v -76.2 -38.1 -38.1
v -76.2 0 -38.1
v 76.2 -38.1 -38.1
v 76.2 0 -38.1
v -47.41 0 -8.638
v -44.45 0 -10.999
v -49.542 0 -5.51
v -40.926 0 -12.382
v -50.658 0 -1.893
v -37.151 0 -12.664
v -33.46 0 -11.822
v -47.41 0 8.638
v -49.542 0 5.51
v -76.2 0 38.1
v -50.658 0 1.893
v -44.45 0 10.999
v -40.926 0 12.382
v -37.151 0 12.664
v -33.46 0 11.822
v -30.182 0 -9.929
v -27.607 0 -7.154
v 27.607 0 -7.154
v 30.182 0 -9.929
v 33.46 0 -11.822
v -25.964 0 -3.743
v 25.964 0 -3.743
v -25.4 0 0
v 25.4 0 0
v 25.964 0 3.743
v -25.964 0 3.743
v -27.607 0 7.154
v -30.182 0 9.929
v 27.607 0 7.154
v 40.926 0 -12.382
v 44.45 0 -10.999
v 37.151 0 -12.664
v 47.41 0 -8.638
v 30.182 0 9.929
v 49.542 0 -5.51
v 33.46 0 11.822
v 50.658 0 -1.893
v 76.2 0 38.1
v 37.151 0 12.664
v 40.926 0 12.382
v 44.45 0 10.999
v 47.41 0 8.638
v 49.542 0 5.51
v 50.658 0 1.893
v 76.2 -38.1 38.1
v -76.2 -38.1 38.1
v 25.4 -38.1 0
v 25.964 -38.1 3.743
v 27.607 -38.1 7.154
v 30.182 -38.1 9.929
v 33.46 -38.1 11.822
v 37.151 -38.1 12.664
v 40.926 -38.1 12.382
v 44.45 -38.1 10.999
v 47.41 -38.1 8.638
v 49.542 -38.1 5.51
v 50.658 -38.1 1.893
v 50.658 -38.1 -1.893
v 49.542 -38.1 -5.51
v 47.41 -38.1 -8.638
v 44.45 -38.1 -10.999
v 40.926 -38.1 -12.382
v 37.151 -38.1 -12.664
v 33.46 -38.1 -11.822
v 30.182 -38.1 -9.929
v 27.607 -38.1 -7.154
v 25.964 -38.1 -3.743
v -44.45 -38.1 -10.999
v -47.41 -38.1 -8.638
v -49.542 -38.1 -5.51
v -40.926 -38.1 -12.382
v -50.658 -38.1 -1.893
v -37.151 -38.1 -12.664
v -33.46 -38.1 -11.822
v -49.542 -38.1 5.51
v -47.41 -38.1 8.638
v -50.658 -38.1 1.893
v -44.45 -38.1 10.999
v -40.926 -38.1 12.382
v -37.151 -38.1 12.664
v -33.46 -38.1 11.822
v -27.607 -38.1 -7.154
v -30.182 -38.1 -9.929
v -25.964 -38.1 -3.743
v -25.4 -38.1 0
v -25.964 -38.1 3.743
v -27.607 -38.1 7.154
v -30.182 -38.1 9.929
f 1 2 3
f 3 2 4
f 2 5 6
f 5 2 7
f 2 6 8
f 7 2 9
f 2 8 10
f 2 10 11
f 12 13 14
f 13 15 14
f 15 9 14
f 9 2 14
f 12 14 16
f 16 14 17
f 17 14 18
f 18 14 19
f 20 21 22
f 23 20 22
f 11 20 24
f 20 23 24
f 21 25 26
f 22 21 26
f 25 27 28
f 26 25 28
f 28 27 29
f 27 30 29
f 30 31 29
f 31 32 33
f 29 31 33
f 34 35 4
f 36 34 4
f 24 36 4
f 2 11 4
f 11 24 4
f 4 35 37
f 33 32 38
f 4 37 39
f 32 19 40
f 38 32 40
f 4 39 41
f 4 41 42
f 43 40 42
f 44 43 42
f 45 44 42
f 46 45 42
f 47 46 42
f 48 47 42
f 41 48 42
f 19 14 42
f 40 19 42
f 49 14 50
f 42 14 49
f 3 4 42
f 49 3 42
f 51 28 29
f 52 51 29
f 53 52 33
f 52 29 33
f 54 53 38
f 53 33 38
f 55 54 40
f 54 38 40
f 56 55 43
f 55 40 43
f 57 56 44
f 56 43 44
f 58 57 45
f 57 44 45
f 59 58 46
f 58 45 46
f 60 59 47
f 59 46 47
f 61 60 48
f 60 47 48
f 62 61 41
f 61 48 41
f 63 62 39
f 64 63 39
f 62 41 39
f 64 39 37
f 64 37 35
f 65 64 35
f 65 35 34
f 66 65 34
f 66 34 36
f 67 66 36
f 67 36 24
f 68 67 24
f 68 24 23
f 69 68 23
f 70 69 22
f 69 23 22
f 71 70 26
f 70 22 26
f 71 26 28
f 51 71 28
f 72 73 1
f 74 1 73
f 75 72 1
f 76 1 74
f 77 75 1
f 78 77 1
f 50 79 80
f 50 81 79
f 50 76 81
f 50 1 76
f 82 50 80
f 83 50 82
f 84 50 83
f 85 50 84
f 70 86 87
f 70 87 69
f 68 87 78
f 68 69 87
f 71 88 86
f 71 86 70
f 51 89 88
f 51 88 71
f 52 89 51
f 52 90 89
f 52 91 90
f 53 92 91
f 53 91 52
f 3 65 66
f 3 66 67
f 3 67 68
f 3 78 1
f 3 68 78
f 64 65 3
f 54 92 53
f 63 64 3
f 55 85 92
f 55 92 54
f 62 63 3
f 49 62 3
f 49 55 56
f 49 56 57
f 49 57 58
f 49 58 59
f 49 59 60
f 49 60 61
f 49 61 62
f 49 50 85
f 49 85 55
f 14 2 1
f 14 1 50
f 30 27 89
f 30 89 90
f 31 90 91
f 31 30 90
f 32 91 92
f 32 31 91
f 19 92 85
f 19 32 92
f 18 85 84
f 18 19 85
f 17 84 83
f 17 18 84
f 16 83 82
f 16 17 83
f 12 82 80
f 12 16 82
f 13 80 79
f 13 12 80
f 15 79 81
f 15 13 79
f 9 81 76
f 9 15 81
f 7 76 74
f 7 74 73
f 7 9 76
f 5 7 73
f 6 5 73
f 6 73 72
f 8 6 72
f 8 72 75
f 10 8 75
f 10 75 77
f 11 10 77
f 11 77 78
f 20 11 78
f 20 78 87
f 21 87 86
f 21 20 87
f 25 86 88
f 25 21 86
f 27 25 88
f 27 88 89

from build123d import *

# Parameters (mm, degrees)
F0_W     = 152.4
F0_H     = 76.2
F0_R     = 12.7
F1_DEPTH = 38.1


with BuildPart() as f1:
    # F0 (on Front) → F1 (new body)
    with BuildSketch(Plane.XZ):
        Rectangle(F0_W, F0_H)
        with Locations((-38.1, 0)):
            Circle(F0_R, mode=Mode.SUBTRACT)
        with BuildLine():
            ThreePointArc((50.8, 0), (38.1, -12.7), (25.4, 0))
            ThreePointArc((25.4, 0), (38.1, 12.7), (50.8, 0))
        make_face(mode=Mode.SUBTRACT)
    extrude(amount=F1_DEPTH)


solid = f1.part
